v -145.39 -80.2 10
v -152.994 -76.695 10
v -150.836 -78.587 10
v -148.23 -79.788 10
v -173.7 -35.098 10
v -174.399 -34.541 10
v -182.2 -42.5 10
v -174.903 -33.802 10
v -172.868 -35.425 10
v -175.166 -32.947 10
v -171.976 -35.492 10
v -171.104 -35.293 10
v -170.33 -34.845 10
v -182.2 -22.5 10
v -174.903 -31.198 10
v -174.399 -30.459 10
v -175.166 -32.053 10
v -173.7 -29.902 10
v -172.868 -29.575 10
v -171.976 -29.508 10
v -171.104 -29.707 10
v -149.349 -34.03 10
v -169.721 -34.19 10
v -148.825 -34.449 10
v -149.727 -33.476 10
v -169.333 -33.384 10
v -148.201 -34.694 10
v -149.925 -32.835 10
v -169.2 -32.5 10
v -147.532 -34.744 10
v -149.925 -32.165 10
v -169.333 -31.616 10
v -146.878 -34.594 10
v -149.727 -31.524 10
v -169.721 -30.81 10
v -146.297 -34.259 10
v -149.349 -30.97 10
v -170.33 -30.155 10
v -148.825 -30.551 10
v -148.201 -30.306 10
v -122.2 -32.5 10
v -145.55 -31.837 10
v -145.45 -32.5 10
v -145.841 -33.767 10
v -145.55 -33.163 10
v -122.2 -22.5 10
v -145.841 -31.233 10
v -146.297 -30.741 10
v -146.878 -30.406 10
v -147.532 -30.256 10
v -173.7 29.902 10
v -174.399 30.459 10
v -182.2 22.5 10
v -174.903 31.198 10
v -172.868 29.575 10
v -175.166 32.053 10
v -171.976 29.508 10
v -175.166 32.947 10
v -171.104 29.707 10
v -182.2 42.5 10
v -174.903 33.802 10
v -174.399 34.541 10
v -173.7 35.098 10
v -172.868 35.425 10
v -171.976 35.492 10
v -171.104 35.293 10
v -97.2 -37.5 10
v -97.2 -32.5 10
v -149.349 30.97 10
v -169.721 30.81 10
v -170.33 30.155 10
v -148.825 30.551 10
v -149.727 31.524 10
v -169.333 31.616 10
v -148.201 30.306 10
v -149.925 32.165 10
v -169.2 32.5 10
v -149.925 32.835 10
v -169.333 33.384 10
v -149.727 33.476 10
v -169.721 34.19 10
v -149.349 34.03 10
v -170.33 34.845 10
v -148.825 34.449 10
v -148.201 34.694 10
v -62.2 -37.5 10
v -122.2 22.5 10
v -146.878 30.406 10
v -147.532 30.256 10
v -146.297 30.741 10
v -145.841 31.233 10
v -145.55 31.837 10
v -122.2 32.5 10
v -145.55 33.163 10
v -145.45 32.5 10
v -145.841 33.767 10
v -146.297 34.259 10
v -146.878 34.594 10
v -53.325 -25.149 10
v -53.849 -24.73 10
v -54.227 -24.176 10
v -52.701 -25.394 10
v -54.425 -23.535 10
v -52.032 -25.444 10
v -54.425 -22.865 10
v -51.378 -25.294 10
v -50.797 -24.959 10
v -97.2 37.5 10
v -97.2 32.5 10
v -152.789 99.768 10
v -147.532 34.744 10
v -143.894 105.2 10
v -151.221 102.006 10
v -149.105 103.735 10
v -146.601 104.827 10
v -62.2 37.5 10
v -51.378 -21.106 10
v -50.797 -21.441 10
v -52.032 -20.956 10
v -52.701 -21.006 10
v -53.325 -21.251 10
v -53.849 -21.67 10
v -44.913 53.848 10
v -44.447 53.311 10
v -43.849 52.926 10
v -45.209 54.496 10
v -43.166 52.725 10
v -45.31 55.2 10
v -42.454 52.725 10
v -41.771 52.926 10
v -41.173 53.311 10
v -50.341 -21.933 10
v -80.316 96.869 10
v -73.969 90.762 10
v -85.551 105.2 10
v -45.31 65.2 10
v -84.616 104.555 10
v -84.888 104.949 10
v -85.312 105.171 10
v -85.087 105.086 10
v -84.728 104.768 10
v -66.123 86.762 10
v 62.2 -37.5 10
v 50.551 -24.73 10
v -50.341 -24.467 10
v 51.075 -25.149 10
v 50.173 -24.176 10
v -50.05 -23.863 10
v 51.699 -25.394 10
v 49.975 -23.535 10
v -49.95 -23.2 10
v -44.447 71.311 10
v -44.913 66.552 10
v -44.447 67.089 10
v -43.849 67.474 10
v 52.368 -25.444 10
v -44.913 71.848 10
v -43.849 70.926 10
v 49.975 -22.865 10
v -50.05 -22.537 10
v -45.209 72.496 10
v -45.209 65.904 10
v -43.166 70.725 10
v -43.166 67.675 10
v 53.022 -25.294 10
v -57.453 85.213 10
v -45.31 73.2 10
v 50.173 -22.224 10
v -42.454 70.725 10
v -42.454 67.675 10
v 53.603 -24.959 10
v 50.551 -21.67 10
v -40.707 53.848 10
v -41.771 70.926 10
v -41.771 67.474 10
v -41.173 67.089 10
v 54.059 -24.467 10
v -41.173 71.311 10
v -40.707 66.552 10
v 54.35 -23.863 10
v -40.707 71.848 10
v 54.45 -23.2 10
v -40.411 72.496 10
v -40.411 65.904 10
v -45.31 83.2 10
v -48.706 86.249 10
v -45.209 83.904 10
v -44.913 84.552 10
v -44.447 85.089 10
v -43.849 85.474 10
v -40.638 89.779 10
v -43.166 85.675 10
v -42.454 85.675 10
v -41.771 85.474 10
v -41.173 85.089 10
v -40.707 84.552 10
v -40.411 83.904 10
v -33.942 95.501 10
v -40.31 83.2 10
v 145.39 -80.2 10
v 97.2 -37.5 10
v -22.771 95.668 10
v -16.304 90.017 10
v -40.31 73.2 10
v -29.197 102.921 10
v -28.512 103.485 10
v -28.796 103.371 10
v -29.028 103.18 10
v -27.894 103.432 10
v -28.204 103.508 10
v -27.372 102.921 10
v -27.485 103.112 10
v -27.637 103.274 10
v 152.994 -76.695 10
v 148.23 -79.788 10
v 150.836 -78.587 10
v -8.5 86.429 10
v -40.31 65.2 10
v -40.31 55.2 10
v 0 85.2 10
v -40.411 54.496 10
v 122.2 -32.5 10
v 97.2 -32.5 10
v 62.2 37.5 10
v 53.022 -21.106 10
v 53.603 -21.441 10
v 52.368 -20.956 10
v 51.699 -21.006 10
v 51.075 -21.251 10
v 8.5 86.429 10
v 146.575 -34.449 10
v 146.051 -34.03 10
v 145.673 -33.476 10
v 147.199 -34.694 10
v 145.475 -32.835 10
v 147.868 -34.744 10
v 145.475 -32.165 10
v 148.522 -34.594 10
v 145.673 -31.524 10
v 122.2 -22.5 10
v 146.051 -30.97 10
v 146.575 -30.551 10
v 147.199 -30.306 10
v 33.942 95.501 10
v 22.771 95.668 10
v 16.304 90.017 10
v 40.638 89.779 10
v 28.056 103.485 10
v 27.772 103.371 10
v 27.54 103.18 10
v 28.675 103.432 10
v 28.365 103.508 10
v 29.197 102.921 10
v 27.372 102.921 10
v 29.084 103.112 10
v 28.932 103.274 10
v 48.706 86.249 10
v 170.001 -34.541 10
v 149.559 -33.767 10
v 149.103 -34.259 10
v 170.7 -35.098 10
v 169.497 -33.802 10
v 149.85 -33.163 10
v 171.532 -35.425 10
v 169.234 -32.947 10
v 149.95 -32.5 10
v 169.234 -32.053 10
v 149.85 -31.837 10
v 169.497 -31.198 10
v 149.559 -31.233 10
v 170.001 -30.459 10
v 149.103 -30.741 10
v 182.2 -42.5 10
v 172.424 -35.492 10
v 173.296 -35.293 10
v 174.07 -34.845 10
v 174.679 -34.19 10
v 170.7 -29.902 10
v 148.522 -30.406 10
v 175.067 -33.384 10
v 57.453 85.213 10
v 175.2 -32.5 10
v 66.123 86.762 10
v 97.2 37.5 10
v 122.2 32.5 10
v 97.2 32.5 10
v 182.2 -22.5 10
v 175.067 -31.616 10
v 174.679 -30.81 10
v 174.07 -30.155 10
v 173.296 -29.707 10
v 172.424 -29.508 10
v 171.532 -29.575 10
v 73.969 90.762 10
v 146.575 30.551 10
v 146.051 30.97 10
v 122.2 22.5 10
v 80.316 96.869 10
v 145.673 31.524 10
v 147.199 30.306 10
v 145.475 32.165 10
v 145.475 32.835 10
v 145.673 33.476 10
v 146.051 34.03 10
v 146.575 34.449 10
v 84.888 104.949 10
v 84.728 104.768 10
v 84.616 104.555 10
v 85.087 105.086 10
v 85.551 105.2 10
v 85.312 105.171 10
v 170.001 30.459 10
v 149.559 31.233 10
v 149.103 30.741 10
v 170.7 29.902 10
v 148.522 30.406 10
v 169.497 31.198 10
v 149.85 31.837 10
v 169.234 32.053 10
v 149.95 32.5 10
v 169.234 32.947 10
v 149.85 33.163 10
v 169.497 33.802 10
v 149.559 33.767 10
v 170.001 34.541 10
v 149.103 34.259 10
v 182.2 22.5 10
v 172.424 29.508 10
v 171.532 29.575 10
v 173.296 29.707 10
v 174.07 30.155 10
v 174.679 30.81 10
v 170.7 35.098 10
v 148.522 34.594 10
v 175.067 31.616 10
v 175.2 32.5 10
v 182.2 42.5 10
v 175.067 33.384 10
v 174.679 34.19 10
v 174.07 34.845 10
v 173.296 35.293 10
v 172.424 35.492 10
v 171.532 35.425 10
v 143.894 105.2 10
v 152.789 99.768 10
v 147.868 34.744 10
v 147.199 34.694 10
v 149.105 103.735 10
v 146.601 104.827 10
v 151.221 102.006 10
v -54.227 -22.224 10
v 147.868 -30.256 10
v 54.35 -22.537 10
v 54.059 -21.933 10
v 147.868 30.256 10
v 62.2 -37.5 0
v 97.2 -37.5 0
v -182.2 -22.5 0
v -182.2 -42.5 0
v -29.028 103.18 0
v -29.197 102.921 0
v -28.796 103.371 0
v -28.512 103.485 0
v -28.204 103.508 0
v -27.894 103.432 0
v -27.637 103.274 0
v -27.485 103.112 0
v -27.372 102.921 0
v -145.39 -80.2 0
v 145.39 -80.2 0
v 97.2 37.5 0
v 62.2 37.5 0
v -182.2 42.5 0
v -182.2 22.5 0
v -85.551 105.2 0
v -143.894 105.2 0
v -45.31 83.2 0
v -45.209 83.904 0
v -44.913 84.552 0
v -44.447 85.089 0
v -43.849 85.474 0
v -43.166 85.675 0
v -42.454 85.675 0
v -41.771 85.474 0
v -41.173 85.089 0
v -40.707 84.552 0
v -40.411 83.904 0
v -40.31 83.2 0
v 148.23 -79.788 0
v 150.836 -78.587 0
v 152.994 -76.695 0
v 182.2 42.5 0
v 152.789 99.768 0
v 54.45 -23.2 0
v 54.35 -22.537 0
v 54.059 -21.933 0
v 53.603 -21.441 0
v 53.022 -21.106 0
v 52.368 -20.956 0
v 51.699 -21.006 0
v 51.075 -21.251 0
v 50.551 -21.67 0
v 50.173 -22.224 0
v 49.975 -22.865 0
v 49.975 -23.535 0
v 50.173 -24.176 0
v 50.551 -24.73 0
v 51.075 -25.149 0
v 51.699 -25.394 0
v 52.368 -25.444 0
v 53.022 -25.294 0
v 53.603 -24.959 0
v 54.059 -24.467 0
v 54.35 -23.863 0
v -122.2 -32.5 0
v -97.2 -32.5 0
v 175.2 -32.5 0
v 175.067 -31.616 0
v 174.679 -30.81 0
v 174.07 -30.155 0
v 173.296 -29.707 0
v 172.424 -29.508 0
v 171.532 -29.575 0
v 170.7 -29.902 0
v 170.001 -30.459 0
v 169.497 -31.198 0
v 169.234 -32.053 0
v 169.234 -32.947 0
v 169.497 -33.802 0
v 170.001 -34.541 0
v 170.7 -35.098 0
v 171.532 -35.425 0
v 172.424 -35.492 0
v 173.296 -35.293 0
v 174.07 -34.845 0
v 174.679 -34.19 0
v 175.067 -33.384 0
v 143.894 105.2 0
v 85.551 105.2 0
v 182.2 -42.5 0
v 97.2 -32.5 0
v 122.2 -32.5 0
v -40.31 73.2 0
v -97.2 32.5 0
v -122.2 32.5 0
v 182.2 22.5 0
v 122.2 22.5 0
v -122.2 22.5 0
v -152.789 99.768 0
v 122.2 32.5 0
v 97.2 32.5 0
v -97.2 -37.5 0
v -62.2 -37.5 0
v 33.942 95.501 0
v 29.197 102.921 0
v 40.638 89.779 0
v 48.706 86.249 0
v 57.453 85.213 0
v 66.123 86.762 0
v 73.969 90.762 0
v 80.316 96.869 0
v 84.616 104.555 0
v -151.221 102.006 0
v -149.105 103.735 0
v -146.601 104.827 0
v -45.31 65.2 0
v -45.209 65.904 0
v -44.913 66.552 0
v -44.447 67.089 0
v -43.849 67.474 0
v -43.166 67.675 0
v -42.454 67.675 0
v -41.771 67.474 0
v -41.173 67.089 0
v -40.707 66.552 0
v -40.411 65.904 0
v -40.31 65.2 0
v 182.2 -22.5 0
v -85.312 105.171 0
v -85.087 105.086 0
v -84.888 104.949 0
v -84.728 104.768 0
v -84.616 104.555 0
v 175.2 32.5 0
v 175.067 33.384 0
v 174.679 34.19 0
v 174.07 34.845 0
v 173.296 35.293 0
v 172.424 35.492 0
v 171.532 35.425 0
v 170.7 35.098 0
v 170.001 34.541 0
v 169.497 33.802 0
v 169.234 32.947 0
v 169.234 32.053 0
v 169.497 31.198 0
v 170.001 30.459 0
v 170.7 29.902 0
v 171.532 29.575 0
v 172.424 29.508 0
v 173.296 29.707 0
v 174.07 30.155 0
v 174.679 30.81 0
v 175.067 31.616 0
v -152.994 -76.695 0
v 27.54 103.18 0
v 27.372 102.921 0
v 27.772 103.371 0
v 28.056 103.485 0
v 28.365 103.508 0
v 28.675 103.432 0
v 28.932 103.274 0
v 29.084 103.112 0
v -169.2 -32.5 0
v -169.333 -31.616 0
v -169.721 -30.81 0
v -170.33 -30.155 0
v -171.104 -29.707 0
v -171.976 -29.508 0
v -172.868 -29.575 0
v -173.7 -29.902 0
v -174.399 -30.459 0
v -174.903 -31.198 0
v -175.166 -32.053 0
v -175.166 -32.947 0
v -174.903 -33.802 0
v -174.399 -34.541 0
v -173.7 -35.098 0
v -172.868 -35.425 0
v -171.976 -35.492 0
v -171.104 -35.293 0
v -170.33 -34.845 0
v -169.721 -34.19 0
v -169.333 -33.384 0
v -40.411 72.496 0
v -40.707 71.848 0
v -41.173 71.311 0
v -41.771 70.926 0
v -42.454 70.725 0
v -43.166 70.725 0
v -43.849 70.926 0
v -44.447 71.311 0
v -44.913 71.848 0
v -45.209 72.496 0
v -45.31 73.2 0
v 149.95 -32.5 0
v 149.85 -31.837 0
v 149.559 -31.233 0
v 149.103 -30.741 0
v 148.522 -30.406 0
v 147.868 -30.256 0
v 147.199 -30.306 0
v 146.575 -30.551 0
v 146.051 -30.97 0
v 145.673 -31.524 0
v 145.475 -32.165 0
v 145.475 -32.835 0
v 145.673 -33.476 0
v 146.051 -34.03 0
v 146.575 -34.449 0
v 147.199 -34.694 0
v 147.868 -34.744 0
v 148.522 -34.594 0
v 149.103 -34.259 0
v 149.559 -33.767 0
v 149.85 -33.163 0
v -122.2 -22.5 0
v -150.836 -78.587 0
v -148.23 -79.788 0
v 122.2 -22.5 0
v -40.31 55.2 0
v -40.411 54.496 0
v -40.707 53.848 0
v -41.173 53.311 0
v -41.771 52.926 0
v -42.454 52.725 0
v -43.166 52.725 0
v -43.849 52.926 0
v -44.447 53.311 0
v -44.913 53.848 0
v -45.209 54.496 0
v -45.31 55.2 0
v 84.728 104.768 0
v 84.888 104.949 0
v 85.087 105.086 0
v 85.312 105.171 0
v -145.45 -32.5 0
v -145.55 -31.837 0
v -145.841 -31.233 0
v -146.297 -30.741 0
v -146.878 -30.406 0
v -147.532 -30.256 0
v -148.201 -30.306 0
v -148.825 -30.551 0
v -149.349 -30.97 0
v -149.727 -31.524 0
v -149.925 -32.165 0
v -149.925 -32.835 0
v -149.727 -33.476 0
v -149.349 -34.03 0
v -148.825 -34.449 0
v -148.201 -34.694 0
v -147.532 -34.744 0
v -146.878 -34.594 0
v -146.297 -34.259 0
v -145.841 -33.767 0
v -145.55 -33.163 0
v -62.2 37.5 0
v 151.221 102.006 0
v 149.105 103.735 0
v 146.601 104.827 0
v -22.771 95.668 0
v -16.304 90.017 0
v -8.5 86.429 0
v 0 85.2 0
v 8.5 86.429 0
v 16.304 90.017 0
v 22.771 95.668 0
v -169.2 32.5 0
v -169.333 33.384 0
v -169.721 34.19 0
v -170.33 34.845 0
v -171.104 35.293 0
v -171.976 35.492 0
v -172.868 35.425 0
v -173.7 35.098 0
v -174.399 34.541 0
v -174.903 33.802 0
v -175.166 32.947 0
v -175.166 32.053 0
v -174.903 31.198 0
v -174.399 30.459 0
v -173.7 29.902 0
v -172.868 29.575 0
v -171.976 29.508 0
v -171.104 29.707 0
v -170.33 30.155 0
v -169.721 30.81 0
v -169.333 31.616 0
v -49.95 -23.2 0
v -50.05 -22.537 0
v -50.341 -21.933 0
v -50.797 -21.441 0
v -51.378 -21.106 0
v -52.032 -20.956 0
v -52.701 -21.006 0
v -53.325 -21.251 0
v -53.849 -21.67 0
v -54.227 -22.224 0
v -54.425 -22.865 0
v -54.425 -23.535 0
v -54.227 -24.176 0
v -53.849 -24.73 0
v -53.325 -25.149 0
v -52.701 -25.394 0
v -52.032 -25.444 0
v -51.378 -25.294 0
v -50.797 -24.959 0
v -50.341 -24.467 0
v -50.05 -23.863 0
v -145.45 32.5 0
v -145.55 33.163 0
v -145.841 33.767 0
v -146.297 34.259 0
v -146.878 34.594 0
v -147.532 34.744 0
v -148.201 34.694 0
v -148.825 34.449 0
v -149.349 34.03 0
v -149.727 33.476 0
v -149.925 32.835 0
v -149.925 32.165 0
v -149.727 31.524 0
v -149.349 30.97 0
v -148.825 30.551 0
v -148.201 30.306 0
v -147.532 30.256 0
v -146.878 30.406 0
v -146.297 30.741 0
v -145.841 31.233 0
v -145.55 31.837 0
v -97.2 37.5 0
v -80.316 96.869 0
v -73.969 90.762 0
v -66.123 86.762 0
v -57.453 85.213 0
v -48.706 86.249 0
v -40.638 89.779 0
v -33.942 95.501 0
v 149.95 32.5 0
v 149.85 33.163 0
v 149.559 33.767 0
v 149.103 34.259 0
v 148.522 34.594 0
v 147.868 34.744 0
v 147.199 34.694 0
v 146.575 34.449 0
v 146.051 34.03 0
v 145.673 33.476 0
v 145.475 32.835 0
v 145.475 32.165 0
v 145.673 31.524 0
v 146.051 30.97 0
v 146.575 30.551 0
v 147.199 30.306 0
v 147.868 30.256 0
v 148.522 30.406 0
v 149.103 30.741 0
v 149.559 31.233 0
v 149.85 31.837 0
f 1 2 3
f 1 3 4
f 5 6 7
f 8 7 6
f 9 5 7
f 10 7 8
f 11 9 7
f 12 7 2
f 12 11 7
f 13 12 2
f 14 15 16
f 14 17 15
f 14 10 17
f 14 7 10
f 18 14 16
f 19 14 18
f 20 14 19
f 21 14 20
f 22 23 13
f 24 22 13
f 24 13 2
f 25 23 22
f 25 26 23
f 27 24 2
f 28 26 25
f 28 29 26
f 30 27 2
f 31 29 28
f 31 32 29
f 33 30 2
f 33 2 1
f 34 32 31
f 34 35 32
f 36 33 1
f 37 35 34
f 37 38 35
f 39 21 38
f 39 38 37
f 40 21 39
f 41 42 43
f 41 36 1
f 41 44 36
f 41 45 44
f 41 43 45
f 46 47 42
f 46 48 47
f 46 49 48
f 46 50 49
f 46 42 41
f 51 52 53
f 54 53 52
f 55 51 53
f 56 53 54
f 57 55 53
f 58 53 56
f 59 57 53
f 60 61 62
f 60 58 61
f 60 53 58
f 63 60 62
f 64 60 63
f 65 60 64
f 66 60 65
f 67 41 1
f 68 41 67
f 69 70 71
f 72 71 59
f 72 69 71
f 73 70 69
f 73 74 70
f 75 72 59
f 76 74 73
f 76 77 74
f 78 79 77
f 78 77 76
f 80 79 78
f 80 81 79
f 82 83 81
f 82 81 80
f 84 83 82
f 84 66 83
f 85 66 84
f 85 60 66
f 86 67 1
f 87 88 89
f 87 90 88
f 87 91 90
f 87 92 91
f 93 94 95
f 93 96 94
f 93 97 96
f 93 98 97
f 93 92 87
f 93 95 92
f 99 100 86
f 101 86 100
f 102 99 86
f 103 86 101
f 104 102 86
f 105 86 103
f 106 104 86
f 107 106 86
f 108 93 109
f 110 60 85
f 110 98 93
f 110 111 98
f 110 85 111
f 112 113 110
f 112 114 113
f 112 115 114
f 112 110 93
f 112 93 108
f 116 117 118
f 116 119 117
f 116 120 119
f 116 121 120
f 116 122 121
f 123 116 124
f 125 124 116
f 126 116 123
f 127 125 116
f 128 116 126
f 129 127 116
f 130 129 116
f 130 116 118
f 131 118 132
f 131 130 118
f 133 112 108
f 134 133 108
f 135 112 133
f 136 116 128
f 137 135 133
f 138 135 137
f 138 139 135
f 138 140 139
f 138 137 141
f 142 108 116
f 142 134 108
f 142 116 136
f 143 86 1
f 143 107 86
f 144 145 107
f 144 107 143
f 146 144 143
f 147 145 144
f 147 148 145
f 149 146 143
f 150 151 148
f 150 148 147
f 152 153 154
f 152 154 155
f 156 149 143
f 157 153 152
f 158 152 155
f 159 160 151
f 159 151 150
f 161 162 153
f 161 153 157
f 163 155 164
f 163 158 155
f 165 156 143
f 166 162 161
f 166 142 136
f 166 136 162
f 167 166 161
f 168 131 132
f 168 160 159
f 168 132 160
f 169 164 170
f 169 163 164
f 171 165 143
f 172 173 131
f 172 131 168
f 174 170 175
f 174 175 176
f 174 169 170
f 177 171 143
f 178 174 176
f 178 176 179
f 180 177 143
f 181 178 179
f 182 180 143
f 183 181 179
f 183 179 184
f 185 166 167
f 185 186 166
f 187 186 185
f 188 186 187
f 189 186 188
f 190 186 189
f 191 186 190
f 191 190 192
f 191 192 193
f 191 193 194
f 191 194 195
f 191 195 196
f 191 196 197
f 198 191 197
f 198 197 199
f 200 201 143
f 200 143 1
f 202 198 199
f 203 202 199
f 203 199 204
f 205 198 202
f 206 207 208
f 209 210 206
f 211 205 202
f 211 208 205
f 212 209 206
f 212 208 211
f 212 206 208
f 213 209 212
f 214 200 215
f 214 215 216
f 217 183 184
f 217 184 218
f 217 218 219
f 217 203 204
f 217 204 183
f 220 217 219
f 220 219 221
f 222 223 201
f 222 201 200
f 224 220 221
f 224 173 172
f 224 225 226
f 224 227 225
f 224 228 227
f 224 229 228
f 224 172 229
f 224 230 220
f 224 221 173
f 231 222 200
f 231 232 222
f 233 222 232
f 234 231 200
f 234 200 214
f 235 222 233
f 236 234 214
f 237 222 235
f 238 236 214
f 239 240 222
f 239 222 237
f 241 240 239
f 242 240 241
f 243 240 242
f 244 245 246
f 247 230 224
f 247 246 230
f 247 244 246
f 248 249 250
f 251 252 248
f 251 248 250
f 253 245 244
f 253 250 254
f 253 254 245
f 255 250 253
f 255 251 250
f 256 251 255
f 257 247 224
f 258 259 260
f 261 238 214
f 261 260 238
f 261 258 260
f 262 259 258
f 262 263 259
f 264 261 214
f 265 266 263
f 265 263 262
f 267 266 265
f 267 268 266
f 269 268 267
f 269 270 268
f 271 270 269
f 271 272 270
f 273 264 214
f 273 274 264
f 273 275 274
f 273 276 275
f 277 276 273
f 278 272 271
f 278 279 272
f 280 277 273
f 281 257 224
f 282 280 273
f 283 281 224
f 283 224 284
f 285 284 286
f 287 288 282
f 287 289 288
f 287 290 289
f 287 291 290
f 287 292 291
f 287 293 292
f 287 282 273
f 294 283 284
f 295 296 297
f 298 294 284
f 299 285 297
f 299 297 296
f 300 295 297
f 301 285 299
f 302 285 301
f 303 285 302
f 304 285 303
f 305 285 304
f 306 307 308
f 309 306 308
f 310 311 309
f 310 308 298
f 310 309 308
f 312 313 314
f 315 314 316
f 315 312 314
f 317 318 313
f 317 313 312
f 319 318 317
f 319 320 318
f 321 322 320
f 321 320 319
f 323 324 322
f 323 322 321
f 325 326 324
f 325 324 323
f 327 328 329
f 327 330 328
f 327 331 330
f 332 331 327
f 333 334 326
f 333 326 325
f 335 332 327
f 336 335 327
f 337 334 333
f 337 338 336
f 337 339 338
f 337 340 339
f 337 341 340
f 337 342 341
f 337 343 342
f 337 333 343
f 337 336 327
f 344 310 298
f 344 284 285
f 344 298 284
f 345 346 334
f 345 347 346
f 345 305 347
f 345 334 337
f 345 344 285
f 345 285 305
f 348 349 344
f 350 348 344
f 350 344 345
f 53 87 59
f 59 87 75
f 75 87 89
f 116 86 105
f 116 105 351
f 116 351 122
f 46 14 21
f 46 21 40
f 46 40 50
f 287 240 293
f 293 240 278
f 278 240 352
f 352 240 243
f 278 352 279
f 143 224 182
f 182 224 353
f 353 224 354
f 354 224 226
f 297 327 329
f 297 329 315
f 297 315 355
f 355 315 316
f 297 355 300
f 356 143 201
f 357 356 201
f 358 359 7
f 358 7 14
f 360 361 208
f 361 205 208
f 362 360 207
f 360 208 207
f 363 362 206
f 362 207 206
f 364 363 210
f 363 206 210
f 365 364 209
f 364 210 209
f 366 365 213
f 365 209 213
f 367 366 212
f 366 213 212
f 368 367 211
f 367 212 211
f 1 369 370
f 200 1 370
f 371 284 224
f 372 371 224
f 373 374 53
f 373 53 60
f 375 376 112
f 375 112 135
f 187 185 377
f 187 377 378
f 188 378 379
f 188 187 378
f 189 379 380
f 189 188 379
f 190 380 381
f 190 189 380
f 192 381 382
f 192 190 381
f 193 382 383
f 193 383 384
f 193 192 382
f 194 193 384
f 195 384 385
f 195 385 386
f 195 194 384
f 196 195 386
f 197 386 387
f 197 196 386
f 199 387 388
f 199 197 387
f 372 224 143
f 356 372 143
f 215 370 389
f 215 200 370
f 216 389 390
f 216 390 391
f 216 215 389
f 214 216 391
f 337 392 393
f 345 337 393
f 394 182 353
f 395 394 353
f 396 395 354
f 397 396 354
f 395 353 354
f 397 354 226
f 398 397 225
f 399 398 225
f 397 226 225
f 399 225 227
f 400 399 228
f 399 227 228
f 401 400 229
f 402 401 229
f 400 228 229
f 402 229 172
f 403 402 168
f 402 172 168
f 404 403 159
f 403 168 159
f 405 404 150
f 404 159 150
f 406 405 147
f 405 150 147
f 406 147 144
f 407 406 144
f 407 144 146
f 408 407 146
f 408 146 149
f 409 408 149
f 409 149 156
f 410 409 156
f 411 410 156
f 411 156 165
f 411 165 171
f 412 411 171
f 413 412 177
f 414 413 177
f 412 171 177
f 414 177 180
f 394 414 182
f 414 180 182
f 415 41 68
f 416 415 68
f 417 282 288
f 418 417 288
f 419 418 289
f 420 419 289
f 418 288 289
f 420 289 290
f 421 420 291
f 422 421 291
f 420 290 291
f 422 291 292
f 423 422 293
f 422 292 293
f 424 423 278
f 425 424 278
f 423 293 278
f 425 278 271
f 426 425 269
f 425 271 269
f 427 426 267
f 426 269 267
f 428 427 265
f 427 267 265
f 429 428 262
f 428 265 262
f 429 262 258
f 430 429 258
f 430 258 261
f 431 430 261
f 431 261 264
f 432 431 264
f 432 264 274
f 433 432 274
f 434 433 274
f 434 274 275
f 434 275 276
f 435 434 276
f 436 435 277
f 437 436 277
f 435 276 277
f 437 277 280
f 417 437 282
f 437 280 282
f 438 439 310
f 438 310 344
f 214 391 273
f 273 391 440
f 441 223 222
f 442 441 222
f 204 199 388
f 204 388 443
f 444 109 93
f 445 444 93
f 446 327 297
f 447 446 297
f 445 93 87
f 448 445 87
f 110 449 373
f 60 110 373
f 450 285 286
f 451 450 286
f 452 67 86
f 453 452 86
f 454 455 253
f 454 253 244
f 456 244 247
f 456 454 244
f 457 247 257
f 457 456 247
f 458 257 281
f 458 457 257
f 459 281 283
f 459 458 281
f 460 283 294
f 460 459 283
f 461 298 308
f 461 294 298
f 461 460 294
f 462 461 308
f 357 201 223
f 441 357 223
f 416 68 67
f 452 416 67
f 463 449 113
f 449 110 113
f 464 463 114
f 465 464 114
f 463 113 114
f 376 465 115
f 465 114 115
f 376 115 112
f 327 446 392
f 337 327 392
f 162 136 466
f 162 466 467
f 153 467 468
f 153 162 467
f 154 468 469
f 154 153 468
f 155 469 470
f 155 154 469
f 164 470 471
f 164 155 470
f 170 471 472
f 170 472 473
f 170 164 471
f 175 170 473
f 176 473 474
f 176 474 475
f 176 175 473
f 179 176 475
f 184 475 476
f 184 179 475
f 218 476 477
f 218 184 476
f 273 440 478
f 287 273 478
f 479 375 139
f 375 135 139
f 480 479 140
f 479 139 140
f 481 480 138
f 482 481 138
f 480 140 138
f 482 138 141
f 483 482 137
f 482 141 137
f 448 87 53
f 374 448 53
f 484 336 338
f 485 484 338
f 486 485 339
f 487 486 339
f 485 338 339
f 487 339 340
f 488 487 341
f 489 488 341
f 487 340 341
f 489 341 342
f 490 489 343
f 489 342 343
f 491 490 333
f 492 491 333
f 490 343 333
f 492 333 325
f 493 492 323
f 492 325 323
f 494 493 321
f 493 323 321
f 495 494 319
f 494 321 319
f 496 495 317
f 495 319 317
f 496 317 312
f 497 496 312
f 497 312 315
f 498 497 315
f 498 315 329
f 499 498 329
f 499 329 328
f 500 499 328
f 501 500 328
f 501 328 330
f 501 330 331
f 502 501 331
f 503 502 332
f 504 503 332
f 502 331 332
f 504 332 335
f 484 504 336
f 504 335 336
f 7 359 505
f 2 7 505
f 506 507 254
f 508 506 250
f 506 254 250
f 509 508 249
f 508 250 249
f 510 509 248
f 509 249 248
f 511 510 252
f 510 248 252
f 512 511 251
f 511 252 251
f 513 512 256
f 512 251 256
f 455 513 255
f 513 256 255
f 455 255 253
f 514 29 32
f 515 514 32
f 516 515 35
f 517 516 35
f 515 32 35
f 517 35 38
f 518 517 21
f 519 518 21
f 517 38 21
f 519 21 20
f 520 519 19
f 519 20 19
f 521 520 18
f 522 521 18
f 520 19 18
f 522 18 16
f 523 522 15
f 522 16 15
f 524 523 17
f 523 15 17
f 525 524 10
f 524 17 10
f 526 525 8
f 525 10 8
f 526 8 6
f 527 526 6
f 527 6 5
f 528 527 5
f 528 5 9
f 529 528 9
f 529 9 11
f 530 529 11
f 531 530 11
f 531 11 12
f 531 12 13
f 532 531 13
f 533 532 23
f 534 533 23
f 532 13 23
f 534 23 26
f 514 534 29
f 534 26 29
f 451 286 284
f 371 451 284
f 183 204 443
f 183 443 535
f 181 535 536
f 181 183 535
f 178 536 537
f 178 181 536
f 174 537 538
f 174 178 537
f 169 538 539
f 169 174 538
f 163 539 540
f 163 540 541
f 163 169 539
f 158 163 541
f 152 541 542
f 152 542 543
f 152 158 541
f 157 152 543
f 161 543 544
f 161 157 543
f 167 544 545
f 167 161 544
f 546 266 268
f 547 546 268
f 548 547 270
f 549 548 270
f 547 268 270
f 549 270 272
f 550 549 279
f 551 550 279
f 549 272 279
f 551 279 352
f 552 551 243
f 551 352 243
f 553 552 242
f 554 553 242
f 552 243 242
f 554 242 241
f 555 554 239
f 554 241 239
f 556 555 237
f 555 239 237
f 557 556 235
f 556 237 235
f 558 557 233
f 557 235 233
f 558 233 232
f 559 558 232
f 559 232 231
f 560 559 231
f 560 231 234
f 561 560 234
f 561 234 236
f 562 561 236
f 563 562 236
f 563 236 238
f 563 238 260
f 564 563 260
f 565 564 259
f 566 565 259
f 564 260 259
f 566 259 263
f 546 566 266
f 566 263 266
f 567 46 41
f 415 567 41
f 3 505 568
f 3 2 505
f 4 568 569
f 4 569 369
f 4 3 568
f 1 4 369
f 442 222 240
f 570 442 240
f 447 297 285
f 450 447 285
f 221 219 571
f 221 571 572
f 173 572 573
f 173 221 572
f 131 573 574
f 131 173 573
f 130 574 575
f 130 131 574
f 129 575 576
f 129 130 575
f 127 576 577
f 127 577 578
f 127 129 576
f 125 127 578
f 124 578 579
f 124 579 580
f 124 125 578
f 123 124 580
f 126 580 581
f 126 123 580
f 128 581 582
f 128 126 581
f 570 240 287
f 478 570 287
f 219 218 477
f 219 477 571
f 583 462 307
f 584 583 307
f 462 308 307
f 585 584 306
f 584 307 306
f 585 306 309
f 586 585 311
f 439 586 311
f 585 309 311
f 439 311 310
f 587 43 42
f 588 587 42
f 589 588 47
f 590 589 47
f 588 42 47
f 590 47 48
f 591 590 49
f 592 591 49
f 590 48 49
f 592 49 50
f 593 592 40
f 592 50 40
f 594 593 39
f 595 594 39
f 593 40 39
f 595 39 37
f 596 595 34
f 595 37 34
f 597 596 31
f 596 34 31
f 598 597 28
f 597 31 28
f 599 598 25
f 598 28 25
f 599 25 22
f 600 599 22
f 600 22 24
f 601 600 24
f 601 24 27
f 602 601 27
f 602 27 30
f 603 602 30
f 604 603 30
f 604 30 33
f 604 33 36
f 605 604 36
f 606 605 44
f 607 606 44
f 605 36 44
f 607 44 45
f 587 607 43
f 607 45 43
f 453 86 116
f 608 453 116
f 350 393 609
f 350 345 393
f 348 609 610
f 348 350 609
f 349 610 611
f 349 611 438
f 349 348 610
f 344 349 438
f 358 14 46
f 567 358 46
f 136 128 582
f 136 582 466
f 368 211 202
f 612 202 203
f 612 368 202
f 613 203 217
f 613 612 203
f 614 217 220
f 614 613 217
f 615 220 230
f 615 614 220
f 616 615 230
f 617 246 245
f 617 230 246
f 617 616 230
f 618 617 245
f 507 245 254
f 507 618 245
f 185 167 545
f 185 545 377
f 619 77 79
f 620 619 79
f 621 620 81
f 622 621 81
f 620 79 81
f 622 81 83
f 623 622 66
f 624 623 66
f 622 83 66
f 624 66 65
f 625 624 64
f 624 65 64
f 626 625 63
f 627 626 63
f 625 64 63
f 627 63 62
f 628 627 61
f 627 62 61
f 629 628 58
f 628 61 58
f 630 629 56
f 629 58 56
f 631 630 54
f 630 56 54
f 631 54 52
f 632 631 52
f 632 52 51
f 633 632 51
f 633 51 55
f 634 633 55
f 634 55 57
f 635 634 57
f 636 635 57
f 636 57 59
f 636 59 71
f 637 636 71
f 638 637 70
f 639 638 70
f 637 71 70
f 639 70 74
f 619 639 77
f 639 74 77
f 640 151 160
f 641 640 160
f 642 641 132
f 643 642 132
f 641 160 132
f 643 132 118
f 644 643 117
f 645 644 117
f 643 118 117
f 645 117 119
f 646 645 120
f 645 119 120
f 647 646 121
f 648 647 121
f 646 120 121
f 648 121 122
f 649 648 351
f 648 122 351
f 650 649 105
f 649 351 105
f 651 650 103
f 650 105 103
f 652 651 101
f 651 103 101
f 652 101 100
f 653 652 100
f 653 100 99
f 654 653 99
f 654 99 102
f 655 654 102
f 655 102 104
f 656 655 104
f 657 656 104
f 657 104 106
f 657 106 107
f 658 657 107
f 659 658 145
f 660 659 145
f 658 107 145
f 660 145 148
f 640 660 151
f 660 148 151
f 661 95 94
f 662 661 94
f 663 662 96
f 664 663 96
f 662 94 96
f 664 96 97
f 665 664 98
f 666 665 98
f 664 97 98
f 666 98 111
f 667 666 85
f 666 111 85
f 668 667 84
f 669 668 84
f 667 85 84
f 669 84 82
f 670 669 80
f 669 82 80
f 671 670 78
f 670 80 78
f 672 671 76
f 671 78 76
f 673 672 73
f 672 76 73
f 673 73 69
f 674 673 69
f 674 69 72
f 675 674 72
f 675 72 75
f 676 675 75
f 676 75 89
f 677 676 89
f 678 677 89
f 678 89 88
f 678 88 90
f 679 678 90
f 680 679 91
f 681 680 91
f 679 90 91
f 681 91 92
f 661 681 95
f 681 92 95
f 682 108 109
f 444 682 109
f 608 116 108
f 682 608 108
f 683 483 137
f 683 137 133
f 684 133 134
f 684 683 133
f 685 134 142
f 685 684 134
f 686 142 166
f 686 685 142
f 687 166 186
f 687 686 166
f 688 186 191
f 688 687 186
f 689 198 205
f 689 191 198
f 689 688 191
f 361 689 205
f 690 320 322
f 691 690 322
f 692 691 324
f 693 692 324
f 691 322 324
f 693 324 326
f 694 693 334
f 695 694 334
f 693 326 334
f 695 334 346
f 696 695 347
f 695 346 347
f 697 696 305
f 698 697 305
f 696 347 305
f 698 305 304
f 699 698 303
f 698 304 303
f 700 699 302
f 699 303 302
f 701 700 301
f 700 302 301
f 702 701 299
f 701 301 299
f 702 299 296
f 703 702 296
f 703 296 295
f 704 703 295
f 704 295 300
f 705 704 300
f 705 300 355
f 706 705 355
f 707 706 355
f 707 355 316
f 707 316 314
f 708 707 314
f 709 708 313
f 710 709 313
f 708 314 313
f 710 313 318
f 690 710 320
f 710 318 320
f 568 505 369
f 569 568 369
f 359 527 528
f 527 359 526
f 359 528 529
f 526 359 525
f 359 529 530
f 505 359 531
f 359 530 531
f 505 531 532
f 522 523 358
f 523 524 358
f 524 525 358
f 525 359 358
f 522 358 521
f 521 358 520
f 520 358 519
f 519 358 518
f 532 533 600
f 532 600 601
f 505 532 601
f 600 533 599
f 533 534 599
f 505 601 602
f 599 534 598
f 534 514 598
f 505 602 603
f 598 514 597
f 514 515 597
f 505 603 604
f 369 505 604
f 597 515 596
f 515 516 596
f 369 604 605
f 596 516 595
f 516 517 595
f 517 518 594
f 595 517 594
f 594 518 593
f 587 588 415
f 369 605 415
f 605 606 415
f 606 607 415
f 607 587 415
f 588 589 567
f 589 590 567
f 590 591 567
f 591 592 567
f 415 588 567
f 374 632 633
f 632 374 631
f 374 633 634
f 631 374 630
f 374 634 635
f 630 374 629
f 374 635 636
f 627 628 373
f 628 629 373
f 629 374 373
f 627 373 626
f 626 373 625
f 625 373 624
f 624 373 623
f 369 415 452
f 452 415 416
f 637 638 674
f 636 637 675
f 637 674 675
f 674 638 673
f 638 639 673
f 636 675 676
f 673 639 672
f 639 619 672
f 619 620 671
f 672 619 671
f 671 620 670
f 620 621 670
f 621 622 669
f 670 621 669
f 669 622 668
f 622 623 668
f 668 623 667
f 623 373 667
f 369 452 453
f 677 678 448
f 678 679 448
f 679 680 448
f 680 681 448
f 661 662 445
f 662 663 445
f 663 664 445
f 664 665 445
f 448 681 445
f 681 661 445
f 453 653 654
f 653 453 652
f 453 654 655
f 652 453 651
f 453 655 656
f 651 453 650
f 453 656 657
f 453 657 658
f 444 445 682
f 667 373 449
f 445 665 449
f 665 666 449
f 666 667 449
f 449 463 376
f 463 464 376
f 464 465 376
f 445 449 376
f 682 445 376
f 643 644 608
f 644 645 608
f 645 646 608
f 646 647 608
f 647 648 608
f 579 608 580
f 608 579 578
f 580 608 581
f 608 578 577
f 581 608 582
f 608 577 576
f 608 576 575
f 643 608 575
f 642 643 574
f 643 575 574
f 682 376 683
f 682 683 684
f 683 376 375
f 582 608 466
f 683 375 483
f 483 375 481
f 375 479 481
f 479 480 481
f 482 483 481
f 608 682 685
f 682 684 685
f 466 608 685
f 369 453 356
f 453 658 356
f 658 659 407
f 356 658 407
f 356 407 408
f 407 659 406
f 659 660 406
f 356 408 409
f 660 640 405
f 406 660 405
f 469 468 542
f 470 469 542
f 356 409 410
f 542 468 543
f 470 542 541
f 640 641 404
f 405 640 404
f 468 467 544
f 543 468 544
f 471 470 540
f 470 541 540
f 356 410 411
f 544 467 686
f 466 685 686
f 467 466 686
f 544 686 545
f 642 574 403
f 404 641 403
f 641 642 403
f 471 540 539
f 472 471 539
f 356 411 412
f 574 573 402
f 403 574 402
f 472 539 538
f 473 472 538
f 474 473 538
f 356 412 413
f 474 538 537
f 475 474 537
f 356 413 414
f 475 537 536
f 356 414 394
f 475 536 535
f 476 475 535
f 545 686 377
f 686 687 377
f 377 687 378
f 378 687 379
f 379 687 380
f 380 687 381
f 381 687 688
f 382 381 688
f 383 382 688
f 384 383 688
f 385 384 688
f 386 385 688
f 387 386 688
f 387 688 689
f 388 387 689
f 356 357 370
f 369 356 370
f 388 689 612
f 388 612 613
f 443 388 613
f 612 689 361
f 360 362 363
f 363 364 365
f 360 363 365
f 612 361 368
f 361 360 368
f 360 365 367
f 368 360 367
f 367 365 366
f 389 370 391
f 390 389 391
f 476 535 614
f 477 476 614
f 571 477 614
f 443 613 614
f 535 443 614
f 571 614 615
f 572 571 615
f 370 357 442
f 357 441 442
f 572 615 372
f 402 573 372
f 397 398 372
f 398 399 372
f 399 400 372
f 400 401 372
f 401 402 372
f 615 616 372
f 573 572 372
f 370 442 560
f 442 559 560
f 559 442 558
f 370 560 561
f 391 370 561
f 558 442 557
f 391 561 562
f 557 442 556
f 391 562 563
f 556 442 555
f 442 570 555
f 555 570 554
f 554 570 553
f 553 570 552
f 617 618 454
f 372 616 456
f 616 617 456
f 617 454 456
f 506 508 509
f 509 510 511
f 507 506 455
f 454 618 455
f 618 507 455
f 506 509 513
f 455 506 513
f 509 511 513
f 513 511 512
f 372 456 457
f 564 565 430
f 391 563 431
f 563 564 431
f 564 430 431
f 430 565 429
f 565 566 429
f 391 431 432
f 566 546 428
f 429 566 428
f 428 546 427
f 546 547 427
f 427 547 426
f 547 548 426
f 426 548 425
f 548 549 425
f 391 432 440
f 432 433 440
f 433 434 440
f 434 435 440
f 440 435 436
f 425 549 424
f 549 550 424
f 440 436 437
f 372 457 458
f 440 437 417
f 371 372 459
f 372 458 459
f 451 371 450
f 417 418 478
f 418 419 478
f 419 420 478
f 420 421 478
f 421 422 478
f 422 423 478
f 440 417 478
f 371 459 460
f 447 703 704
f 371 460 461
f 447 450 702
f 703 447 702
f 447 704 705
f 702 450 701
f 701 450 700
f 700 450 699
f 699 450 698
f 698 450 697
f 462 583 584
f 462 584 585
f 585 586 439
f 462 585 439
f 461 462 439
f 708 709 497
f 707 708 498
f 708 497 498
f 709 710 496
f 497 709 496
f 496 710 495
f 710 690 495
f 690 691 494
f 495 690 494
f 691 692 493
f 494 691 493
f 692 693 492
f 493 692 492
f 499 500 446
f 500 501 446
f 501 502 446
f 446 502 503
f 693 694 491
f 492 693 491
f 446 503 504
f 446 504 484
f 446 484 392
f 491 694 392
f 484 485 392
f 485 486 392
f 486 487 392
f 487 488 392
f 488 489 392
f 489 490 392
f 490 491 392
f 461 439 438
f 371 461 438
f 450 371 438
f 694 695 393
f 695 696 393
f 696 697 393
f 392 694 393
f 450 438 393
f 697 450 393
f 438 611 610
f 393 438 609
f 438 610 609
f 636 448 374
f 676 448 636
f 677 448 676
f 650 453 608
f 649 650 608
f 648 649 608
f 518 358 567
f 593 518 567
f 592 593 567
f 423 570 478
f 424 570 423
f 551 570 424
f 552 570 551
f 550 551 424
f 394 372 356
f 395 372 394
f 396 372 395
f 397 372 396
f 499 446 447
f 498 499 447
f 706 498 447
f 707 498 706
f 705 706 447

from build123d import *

# Parameters (mm, degrees)
ESQUISSE3_W                  = 364.4
ESQUISSE3_H                  = 85
ESQUISSE3_W_2                = 300
ESQUISSE3_H_2                = 62.7
ESQUISSE3_H_3                = 37.7
BOSS_EXTRU_1_DEPTH           = 10
ENL_V_MAT_EXTRU_1_DEPTH      = 10
ENL_V_MAT_EXTRU_2_DEPTH      = 211.627348652
ENL_V_MAT_EXTRU_2_DEPTH_BACK = 10
ESQUISSE10_R                 = 2.25
ESQUISSE10_R_2               = 3
ENL_V_MAT_EXTRU_3_DEPTH      = 10
ESQUISSE15_R                 = 2.25
ENL_V_MAT_EXTRU_4_DEPTH      = 10
CONG_1_R                     = 10
CONG_3_R                     = 1
ENL_V_MAT_EXTRU_5_DEPTH      = 10


with BuildPart() as part:
    # Esquisse3 → Boss.-Extru.1 (new body)
    with BuildSketch(Plane.XY):
        Rectangle(ESQUISSE3_W, ESQUISSE3_H)
        with Locations((0, 73.85)):
            Rectangle(ESQUISSE3_W_2, ESQUISSE3_H_2)
        with Locations((0, -61.35)):
            Rectangle(ESQUISSE3_W_2, ESQUISSE3_H_3)
        Polygon((-150, 105.2), (-182.2, 42.5), (-150, 42.5), align=None)
        Polygon((-150, -42.5), (-182.2, -42.5), (-150, -80.2), align=None)
        Polygon((182.2, -42.5), (150, -42.5), (150, -80.2), align=None)
        Polygon((182.2, 42.5), (150, 105.2), (150, 42.5), align=None)
    extrude(amount=BOSS_EXTRU_1_DEPTH)

    # Esquisse4 → Enlèv. mat.-Extru.1 (cut)
    with BuildSketch(Plane.XY.offset(10)):
        Polygon((-97.2, 32.5), (-122.2, 32.5), (-122.2, 22.5), (-182.2, 22.5), (-182.2, -22.5), (-122.2, -22.5), (-122.2, -32.5), (-97.2, -32.5), (-97.2, -37.5), (-62.2, -37.5), (-62.2, 37.5), (-97.2, 37.5), align=None)
        Polygon((122.2, 22.5), (122.2, 32.5), (97.2, 32.5), (97.2, 37.5), (62.2, 37.5), (62.2, -37.5), (97.2, -37.5), (97.2, -32.5), (122.2, -32.5), (122.2, -22.5), (182.2, -22.5), (182.2, 22.5), align=None)
    extrude(amount=-ENL_V_MAT_EXTRU_1_DEPTH, mode=Mode.SUBTRACT)

    # Esquisse5 → Enlèv. mat.-Extru.2 (cut, two sides: drawn at the far end of the back side and taken through both)
    with BuildSketch(Plane.XY.offset(10).offset(-ENL_V_MAT_EXTRU_2_DEPTH_BACK)):
        with BuildLine():
            Line((84.852813742, 105.2), (28.284271247, 105.2))
            ThreePointArc((28.284271247, 105.2), (56.568542495, 85.2), (84.852813742, 105.2))
        make_face()
        with BuildLine():
            ThreePointArc((-28.284271247, 105.2), (0, 85.2), (28.284271247, 105.2))
            Line((28.284271247, 105.2), (-28.284271247, 105.2))
        make_face()
        with BuildLine():
            ThreePointArc((-84.852813742, 105.2), (-56.568542495, 85.2), (-28.284271247, 105.2))
            Line((-28.284271247, 105.2), (-84.852813742, 105.2))
        make_face()
    extrude(amount=ENL_V_MAT_EXTRU_2_DEPTH + ENL_V_MAT_EXTRU_2_DEPTH_BACK, mode=Mode.SUBTRACT)

    # Esquisse10 → Enlèv. mat.-Extru.3 (cut)
    with BuildSketch(Plane.XY.offset(10)):
        with Locations((-147.7, 32.5)):
            Circle(ESQUISSE10_R)
        with Locations((-172.2, 32.5)):
            Circle(ESQUISSE10_R_2)
        with Locations((-172.2, -32.5)):
            Circle(ESQUISSE10_R_2)
        with Locations((-147.7, -32.5)):
            Circle(ESQUISSE10_R)
        with Locations((172.2, 32.5)):
            Circle(ESQUISSE10_R_2)
        with Locations((147.7, 32.5)):
            Circle(ESQUISSE10_R)
        with Locations((172.2, -32.5)):
            Circle(ESQUISSE10_R_2)
        with Locations((147.7, -32.5)):
            Circle(ESQUISSE10_R)
    extrude(amount=-ENL_V_MAT_EXTRU_3_DEPTH, mode=Mode.SUBTRACT)

    # Esquisse15 → Enlèv. mat.-Extru.4 (cut)
    with BuildSketch(Plane.XY.offset(10)):
        with Locations((-52.2, -23.2)):
            Circle(ESQUISSE15_R)
        with Locations((52.2, -23.2)):
            Circle(ESQUISSE15_R)
    extrude(amount=-ENL_V_MAT_EXTRU_4_DEPTH, mode=Mode.SUBTRACT)

    # Congé1
    cong_1_edges = [part.edges().sort_by_distance(p)[0] for p in [
        (150, -80.2, 5),
        (-150, -80.2, 5),
        (-150, 105.2, 5),
        (150, 105.2, 5),
    ]]
    fillet(cong_1_edges, radius=CONG_1_R)

    # Congé3
    cong_3_edges = [part.edges().sort_by_distance(p)[0] for p in [
        (-84.852813742, 105.2, 5),
        (84.852813742, 105.2, 5),
        (28.284271247, 105.2, 5),
        (-28.284271247, 105.2, 5),
    ]]
    fillet(cong_3_edges, radius=CONG_3_R)

    # Esquisse17 → Enlèv. mat.-Extru.5 (cut)
    with BuildSketch(Plane.XY.offset(10)):
        with BuildLine():
            Line((-40.31, 83.2), (-40.31, 73.2))
            ThreePointArc((-40.31, 73.2), (-42.81, 70.7), (-45.31, 73.2))
            Line((-45.31, 73.2), (-45.31, 83.2))
            ThreePointArc((-45.31, 83.2), (-42.81, 85.7), (-40.31, 83.2))
        make_face()
        with BuildLine():
            Line((-40.31, 65.2), (-40.31, 55.2))
            ThreePointArc((-40.31, 55.2), (-42.81, 52.7), (-45.31, 55.2))
            Line((-45.31, 55.2), (-45.31, 65.2))
            ThreePointArc((-45.31, 65.2), (-42.81, 67.7), (-40.31, 65.2))
        make_face()
    extrude(amount=-ENL_V_MAT_EXTRU_5_DEPTH, mode=Mode.SUBTRACT)


solid = part.part
